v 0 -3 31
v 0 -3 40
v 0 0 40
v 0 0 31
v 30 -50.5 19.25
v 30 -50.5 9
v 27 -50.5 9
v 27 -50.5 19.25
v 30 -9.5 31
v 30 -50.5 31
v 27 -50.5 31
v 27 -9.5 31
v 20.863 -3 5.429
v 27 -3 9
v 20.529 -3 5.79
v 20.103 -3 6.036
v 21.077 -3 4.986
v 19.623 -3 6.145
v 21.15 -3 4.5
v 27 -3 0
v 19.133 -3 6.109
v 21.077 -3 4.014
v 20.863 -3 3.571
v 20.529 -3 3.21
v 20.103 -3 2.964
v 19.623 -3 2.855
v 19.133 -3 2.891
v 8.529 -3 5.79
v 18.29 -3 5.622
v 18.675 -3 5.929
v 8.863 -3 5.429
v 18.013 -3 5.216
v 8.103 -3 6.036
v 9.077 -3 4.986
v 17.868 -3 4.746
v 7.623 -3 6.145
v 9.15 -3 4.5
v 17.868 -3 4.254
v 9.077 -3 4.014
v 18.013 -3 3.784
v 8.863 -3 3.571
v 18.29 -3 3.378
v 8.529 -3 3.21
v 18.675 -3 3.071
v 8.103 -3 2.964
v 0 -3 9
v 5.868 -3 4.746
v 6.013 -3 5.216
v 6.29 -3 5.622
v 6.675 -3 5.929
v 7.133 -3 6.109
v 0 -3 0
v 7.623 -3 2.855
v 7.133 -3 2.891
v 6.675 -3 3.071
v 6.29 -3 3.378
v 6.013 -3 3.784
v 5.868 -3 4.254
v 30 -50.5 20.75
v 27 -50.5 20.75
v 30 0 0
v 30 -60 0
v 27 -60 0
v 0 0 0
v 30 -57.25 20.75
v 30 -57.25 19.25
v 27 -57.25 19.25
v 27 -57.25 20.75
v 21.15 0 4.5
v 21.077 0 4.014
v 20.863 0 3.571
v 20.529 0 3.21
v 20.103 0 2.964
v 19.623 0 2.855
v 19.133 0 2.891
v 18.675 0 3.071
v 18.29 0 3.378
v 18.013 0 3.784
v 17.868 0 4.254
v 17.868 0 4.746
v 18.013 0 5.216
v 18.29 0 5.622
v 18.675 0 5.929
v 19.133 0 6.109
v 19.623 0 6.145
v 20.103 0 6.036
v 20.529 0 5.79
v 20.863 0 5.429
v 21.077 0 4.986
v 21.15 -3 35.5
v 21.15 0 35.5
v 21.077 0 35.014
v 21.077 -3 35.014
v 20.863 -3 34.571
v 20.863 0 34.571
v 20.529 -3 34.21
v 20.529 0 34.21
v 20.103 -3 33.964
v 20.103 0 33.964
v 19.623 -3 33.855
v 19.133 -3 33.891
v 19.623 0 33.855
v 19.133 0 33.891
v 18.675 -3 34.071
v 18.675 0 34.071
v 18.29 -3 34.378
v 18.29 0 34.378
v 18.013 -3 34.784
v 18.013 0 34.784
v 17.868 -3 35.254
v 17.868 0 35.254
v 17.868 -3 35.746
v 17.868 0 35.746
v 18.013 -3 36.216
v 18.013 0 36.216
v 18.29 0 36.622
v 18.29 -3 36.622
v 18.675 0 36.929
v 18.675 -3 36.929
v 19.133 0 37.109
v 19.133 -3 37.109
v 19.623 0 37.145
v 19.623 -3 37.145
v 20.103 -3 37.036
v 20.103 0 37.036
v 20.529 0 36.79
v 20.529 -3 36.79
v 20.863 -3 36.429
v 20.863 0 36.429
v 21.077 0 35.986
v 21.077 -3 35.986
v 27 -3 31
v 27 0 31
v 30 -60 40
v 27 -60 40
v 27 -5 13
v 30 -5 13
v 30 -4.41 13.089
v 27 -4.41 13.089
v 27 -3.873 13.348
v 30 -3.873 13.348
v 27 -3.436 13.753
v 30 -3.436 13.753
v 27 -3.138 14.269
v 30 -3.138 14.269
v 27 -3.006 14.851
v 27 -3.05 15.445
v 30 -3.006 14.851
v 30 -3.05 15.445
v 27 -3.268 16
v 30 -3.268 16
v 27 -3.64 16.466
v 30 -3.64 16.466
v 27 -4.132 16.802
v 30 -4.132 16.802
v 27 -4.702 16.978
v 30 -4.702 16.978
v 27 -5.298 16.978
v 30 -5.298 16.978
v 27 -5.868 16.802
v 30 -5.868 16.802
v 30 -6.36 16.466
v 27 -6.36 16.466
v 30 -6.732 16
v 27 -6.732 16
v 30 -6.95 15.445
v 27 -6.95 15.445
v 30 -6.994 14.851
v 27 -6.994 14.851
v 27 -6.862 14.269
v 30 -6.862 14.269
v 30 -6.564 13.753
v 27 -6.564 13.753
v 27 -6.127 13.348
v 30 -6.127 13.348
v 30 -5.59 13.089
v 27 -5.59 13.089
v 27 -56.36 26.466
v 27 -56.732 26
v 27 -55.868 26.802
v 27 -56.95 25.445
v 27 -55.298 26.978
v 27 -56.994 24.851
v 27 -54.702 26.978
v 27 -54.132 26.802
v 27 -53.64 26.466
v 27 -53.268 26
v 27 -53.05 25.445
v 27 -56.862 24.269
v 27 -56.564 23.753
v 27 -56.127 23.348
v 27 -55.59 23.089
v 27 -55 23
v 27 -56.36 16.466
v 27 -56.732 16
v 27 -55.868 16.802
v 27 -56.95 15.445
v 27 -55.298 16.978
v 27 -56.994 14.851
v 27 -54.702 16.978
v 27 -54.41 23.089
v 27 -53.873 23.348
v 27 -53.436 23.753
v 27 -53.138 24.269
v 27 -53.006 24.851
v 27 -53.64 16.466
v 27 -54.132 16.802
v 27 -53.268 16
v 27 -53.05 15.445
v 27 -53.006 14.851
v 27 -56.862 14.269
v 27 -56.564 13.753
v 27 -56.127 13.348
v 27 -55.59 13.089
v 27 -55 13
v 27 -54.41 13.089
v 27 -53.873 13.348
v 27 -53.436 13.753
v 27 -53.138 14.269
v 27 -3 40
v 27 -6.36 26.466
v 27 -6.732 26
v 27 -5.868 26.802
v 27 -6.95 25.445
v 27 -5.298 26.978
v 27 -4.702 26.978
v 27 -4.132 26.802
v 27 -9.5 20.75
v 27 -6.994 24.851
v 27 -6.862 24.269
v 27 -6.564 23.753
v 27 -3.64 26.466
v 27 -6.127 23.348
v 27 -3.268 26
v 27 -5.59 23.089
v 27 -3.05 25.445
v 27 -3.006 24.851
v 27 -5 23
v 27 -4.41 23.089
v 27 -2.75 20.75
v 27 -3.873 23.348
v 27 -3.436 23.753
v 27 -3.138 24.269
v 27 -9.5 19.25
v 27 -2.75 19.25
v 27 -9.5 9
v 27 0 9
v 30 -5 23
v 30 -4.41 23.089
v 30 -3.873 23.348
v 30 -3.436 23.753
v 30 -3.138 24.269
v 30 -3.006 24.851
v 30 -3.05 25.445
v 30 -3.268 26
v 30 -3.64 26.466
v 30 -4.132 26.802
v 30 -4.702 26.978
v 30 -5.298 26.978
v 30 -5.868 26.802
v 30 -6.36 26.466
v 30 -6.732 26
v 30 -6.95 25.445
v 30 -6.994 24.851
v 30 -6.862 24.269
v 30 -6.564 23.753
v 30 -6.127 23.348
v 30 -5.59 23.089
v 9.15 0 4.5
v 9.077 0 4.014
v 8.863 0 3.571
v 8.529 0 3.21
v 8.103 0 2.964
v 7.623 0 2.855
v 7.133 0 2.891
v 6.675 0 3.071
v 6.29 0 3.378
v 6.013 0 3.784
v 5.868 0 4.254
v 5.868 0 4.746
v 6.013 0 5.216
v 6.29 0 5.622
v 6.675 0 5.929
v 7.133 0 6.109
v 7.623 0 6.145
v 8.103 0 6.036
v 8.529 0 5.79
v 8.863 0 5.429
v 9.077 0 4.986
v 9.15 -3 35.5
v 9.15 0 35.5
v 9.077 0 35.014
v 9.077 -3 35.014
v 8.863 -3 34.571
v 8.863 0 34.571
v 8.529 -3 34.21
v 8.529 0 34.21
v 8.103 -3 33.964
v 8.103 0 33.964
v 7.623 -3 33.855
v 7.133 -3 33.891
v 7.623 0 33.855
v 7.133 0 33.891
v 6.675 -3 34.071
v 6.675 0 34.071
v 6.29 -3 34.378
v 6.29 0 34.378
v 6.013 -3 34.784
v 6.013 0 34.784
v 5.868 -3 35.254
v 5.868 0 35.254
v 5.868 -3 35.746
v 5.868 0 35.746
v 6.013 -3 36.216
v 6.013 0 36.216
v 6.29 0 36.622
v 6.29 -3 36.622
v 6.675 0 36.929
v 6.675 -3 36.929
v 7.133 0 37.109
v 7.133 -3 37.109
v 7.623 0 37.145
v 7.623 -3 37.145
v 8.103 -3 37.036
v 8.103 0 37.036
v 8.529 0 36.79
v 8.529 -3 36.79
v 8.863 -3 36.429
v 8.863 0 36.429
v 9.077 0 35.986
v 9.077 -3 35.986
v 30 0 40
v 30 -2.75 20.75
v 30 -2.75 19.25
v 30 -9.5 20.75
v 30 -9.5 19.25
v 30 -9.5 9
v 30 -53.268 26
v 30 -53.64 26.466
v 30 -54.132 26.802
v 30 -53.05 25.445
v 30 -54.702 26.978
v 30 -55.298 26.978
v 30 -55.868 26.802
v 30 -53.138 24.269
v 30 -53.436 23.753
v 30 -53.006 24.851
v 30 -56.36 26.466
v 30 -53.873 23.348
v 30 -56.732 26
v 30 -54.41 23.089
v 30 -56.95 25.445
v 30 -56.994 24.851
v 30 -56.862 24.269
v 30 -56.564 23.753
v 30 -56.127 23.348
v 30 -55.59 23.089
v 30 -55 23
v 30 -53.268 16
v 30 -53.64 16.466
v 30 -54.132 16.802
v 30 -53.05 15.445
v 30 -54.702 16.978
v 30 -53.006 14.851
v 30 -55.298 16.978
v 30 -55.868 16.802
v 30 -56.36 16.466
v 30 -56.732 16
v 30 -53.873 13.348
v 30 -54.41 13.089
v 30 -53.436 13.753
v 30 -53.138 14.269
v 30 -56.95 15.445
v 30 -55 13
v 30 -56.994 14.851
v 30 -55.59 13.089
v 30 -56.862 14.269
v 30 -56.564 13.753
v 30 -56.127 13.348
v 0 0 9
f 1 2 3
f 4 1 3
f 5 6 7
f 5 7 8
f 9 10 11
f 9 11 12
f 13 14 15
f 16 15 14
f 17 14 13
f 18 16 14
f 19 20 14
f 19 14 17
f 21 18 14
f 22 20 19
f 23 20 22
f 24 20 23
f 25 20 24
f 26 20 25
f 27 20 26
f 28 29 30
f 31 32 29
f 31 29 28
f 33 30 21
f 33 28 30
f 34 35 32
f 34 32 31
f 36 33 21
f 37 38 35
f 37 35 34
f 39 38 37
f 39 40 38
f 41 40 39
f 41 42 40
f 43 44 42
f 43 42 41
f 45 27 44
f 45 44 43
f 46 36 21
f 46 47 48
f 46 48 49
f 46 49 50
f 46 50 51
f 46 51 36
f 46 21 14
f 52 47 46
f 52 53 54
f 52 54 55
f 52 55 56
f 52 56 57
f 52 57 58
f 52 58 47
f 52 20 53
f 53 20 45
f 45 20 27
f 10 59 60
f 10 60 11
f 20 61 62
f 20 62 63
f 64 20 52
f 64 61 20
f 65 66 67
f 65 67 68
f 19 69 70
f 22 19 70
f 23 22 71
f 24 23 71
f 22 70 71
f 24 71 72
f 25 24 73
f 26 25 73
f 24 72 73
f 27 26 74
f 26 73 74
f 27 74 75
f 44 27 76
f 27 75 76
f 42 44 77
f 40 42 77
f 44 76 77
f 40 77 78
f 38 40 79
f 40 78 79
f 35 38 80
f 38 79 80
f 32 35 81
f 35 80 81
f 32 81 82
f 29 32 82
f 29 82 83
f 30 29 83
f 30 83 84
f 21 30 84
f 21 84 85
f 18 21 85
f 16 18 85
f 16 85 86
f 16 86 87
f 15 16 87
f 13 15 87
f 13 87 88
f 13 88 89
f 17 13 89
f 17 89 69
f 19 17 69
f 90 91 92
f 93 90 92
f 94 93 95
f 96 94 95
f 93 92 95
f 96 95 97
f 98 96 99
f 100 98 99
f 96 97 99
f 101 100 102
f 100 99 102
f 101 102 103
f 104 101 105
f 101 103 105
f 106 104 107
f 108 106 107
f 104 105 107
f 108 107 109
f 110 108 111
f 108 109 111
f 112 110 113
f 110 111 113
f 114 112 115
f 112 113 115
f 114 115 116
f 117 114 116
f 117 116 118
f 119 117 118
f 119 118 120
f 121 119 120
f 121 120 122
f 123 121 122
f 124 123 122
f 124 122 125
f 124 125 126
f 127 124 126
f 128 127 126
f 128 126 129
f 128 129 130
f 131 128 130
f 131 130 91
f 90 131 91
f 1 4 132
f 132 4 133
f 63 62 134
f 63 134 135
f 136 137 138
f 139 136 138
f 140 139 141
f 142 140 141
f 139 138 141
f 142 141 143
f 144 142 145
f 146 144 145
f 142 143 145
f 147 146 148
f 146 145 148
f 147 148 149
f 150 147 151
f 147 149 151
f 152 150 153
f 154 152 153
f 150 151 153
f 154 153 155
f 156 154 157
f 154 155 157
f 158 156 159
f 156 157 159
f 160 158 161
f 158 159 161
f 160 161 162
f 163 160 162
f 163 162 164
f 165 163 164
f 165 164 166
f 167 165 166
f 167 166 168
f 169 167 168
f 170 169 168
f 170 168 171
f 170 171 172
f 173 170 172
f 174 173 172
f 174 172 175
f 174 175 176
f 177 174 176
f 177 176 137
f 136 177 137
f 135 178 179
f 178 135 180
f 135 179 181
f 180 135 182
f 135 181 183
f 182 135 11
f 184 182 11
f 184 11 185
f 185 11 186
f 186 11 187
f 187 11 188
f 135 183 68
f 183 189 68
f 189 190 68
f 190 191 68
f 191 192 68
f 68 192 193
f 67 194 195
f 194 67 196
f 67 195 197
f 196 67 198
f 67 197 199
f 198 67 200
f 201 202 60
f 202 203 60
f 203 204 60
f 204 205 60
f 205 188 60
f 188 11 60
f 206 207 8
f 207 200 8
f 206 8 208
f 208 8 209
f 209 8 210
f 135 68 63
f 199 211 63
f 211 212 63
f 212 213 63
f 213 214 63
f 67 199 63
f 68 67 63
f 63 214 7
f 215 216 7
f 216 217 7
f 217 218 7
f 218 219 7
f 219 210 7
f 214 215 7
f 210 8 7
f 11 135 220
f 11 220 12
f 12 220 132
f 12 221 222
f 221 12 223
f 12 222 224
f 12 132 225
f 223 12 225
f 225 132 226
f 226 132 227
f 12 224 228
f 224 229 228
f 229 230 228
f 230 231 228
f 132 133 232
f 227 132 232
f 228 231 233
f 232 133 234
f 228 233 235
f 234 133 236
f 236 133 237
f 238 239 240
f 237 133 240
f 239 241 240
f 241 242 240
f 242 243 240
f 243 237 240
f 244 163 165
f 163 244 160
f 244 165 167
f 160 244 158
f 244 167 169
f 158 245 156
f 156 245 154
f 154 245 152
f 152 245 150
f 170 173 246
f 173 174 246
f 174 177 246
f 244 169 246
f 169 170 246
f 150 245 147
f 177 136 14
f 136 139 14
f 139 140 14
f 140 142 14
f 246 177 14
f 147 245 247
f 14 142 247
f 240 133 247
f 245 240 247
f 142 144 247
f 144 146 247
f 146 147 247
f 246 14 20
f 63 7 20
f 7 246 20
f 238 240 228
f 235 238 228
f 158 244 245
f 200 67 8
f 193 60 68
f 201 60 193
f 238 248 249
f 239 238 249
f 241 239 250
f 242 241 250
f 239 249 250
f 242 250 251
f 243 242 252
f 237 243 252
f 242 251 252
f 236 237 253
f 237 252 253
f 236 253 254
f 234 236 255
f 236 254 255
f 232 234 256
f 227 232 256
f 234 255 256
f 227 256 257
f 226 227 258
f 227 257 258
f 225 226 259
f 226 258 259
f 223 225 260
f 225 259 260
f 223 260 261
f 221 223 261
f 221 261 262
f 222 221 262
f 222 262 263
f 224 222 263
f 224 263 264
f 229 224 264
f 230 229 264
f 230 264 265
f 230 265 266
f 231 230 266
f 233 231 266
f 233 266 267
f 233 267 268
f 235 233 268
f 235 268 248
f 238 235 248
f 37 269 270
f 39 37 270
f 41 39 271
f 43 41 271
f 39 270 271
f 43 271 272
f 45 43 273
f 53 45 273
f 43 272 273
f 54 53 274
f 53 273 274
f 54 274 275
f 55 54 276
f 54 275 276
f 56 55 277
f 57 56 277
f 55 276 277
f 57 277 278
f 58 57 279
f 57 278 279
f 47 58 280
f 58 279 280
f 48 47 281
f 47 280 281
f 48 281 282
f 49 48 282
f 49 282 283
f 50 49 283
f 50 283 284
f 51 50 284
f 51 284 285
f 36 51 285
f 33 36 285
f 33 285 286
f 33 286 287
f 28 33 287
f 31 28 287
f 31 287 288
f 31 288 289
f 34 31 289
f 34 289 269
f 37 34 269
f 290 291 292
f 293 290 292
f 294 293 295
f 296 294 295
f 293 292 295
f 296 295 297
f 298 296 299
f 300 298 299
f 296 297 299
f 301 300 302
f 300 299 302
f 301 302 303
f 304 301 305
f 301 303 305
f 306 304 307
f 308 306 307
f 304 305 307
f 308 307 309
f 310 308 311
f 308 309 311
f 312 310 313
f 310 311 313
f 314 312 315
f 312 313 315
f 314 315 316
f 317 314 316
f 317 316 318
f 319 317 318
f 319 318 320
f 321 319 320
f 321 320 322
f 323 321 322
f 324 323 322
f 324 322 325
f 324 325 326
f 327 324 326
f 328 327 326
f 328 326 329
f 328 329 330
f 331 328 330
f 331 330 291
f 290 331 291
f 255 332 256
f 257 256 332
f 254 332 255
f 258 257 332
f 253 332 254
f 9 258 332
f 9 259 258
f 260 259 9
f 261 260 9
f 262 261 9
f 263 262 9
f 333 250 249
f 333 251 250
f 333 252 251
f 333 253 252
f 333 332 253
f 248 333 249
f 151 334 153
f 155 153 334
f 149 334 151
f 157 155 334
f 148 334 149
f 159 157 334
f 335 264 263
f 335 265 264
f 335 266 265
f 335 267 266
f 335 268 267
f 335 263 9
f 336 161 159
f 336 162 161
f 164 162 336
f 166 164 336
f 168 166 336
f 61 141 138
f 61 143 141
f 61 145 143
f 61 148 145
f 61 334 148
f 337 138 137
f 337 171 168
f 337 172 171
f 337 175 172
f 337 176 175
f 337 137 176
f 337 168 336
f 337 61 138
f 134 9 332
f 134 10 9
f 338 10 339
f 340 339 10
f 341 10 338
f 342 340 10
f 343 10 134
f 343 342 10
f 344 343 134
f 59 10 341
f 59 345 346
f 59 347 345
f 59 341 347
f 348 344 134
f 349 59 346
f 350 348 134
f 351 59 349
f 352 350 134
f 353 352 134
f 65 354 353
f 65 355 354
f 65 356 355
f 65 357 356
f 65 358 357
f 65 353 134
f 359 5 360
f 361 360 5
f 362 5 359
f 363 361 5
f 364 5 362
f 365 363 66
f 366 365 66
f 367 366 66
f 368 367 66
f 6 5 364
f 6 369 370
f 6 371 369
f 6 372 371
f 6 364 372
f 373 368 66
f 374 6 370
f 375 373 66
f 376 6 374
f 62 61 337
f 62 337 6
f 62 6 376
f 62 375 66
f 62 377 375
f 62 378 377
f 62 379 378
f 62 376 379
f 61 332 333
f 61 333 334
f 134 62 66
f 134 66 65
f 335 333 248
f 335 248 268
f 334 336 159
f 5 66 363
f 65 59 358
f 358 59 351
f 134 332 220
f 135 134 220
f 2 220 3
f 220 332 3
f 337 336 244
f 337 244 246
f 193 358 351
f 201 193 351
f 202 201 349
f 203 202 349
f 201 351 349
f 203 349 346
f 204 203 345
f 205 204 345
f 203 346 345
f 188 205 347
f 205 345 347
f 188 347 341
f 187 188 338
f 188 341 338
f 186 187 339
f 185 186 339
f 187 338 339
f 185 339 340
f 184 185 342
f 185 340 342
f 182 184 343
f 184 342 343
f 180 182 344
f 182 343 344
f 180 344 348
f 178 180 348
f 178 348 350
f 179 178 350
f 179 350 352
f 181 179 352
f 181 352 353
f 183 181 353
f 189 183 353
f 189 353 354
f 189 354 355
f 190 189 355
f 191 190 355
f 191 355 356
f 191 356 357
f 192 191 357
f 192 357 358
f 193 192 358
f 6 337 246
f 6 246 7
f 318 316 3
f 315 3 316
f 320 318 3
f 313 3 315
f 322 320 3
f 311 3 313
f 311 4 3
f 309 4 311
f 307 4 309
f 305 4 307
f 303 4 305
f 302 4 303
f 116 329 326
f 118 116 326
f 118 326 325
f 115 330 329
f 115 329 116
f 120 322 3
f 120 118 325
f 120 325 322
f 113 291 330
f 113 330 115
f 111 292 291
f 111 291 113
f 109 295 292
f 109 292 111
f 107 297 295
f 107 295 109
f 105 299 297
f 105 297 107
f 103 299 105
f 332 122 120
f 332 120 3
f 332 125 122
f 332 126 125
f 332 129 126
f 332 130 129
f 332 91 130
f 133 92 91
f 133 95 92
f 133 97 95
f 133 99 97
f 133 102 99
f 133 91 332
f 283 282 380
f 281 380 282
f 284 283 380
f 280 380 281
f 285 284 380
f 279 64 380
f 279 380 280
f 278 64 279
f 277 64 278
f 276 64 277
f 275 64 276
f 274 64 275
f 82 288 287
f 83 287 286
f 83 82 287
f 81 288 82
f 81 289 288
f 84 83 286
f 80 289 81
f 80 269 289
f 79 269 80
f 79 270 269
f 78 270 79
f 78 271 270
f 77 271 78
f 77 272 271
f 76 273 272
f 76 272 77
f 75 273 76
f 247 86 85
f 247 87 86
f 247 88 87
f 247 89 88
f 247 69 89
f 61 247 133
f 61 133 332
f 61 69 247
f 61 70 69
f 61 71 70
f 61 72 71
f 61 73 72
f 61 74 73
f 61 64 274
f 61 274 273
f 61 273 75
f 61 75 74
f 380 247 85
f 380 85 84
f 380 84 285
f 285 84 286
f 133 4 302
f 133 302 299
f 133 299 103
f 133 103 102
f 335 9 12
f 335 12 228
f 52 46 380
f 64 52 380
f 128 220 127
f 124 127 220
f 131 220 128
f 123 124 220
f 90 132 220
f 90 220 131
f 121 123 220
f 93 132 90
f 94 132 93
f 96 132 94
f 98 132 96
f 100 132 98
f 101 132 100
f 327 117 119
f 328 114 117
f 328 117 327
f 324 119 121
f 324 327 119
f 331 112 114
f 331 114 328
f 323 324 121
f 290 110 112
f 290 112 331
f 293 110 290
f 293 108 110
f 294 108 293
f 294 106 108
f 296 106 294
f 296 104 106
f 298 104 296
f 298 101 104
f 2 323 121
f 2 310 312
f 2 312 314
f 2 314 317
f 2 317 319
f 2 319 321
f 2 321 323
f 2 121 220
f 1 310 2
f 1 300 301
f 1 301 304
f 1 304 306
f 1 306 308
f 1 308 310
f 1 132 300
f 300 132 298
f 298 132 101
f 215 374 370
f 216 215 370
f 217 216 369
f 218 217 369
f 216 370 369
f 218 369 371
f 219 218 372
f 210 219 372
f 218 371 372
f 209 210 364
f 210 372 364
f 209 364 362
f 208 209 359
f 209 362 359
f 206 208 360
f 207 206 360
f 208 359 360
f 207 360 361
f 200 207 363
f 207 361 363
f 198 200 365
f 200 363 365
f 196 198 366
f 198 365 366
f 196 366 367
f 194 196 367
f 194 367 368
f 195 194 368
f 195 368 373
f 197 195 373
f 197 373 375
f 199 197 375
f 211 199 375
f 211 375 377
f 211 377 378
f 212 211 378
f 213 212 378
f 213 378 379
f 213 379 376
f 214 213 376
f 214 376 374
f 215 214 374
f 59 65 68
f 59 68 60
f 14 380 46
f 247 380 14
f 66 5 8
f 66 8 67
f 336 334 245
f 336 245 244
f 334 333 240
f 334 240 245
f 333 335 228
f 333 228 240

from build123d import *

# Parameters (mm, degrees)
EXTRUDE_1_DEPTH     = 40
SKETCH_2_R          = 1.65
SKETCH_2_W          = 27
SKETCH_2_H          = 22
CUT_EXTRUDE_2_DEPTH = 10
SKETCH_3_R          = 2
CUT_EXTRUDE_3_DEPTH = 10


with BuildPart() as part:
    # 草图1 → 凸台-拉伸1 (new body)
    with BuildSketch(Plane.XY):
        Polygon((0, 0), (30, 0), (30, -60), (27, -60), (27, -3), (0, -3), align=None)
    extrude(amount=EXTRUDE_1_DEPTH)

    # 草图2 → 切除-拉伸2 (cut)
    with BuildSketch(Plane(origin=(0, 0, 0), x_dir=(1, 0, 0), z_dir=(0, 1, 0))):
        with Locations((7.5, -4.5)):
            Circle(SKETCH_2_R)
        with Locations((19.5, -4.5)):
            Circle(SKETCH_2_R)
        with Locations((19.5, -35.5)):
            Circle(SKETCH_2_R)
        with Locations((7.5, -35.5)):
            Circle(SKETCH_2_R)
        with Locations((13.5, -20)):
            Rectangle(SKETCH_2_W, SKETCH_2_H)
    extrude(amount=-CUT_EXTRUDE_2_DEPTH, mode=Mode.SUBTRACT)

    # 草图3 → 切除-拉伸3 (cut)
    with BuildSketch(Plane(origin=(30, 0, 0), x_dir=(0, 0, -1), z_dir=(1, 0, 0))):
        with Locations((-25, -5)):
            Circle(SKETCH_3_R)
        with Locations((-15, -5)):
            Circle(SKETCH_3_R)
        with Locations((-15, -55)):
            Circle(SKETCH_3_R)
        with Locations((-25, -55)):
            Circle(SKETCH_3_R)
        Polygon((-20.75, -9.5), (-20.75, -2.75), (-19.25, -2.75), (-19.25, -9.5), (-9, -9.5), (-9, -50.5), (-19.25, -50.5), (-19.25, -57.25), (-20.75, -57.25), (-20.75, -50.5), (-31, -50.5), (-31, -9.5), align=None)
    extrude(amount=-CUT_EXTRUDE_3_DEPTH, mode=Mode.SUBTRACT)


solid = part.part
